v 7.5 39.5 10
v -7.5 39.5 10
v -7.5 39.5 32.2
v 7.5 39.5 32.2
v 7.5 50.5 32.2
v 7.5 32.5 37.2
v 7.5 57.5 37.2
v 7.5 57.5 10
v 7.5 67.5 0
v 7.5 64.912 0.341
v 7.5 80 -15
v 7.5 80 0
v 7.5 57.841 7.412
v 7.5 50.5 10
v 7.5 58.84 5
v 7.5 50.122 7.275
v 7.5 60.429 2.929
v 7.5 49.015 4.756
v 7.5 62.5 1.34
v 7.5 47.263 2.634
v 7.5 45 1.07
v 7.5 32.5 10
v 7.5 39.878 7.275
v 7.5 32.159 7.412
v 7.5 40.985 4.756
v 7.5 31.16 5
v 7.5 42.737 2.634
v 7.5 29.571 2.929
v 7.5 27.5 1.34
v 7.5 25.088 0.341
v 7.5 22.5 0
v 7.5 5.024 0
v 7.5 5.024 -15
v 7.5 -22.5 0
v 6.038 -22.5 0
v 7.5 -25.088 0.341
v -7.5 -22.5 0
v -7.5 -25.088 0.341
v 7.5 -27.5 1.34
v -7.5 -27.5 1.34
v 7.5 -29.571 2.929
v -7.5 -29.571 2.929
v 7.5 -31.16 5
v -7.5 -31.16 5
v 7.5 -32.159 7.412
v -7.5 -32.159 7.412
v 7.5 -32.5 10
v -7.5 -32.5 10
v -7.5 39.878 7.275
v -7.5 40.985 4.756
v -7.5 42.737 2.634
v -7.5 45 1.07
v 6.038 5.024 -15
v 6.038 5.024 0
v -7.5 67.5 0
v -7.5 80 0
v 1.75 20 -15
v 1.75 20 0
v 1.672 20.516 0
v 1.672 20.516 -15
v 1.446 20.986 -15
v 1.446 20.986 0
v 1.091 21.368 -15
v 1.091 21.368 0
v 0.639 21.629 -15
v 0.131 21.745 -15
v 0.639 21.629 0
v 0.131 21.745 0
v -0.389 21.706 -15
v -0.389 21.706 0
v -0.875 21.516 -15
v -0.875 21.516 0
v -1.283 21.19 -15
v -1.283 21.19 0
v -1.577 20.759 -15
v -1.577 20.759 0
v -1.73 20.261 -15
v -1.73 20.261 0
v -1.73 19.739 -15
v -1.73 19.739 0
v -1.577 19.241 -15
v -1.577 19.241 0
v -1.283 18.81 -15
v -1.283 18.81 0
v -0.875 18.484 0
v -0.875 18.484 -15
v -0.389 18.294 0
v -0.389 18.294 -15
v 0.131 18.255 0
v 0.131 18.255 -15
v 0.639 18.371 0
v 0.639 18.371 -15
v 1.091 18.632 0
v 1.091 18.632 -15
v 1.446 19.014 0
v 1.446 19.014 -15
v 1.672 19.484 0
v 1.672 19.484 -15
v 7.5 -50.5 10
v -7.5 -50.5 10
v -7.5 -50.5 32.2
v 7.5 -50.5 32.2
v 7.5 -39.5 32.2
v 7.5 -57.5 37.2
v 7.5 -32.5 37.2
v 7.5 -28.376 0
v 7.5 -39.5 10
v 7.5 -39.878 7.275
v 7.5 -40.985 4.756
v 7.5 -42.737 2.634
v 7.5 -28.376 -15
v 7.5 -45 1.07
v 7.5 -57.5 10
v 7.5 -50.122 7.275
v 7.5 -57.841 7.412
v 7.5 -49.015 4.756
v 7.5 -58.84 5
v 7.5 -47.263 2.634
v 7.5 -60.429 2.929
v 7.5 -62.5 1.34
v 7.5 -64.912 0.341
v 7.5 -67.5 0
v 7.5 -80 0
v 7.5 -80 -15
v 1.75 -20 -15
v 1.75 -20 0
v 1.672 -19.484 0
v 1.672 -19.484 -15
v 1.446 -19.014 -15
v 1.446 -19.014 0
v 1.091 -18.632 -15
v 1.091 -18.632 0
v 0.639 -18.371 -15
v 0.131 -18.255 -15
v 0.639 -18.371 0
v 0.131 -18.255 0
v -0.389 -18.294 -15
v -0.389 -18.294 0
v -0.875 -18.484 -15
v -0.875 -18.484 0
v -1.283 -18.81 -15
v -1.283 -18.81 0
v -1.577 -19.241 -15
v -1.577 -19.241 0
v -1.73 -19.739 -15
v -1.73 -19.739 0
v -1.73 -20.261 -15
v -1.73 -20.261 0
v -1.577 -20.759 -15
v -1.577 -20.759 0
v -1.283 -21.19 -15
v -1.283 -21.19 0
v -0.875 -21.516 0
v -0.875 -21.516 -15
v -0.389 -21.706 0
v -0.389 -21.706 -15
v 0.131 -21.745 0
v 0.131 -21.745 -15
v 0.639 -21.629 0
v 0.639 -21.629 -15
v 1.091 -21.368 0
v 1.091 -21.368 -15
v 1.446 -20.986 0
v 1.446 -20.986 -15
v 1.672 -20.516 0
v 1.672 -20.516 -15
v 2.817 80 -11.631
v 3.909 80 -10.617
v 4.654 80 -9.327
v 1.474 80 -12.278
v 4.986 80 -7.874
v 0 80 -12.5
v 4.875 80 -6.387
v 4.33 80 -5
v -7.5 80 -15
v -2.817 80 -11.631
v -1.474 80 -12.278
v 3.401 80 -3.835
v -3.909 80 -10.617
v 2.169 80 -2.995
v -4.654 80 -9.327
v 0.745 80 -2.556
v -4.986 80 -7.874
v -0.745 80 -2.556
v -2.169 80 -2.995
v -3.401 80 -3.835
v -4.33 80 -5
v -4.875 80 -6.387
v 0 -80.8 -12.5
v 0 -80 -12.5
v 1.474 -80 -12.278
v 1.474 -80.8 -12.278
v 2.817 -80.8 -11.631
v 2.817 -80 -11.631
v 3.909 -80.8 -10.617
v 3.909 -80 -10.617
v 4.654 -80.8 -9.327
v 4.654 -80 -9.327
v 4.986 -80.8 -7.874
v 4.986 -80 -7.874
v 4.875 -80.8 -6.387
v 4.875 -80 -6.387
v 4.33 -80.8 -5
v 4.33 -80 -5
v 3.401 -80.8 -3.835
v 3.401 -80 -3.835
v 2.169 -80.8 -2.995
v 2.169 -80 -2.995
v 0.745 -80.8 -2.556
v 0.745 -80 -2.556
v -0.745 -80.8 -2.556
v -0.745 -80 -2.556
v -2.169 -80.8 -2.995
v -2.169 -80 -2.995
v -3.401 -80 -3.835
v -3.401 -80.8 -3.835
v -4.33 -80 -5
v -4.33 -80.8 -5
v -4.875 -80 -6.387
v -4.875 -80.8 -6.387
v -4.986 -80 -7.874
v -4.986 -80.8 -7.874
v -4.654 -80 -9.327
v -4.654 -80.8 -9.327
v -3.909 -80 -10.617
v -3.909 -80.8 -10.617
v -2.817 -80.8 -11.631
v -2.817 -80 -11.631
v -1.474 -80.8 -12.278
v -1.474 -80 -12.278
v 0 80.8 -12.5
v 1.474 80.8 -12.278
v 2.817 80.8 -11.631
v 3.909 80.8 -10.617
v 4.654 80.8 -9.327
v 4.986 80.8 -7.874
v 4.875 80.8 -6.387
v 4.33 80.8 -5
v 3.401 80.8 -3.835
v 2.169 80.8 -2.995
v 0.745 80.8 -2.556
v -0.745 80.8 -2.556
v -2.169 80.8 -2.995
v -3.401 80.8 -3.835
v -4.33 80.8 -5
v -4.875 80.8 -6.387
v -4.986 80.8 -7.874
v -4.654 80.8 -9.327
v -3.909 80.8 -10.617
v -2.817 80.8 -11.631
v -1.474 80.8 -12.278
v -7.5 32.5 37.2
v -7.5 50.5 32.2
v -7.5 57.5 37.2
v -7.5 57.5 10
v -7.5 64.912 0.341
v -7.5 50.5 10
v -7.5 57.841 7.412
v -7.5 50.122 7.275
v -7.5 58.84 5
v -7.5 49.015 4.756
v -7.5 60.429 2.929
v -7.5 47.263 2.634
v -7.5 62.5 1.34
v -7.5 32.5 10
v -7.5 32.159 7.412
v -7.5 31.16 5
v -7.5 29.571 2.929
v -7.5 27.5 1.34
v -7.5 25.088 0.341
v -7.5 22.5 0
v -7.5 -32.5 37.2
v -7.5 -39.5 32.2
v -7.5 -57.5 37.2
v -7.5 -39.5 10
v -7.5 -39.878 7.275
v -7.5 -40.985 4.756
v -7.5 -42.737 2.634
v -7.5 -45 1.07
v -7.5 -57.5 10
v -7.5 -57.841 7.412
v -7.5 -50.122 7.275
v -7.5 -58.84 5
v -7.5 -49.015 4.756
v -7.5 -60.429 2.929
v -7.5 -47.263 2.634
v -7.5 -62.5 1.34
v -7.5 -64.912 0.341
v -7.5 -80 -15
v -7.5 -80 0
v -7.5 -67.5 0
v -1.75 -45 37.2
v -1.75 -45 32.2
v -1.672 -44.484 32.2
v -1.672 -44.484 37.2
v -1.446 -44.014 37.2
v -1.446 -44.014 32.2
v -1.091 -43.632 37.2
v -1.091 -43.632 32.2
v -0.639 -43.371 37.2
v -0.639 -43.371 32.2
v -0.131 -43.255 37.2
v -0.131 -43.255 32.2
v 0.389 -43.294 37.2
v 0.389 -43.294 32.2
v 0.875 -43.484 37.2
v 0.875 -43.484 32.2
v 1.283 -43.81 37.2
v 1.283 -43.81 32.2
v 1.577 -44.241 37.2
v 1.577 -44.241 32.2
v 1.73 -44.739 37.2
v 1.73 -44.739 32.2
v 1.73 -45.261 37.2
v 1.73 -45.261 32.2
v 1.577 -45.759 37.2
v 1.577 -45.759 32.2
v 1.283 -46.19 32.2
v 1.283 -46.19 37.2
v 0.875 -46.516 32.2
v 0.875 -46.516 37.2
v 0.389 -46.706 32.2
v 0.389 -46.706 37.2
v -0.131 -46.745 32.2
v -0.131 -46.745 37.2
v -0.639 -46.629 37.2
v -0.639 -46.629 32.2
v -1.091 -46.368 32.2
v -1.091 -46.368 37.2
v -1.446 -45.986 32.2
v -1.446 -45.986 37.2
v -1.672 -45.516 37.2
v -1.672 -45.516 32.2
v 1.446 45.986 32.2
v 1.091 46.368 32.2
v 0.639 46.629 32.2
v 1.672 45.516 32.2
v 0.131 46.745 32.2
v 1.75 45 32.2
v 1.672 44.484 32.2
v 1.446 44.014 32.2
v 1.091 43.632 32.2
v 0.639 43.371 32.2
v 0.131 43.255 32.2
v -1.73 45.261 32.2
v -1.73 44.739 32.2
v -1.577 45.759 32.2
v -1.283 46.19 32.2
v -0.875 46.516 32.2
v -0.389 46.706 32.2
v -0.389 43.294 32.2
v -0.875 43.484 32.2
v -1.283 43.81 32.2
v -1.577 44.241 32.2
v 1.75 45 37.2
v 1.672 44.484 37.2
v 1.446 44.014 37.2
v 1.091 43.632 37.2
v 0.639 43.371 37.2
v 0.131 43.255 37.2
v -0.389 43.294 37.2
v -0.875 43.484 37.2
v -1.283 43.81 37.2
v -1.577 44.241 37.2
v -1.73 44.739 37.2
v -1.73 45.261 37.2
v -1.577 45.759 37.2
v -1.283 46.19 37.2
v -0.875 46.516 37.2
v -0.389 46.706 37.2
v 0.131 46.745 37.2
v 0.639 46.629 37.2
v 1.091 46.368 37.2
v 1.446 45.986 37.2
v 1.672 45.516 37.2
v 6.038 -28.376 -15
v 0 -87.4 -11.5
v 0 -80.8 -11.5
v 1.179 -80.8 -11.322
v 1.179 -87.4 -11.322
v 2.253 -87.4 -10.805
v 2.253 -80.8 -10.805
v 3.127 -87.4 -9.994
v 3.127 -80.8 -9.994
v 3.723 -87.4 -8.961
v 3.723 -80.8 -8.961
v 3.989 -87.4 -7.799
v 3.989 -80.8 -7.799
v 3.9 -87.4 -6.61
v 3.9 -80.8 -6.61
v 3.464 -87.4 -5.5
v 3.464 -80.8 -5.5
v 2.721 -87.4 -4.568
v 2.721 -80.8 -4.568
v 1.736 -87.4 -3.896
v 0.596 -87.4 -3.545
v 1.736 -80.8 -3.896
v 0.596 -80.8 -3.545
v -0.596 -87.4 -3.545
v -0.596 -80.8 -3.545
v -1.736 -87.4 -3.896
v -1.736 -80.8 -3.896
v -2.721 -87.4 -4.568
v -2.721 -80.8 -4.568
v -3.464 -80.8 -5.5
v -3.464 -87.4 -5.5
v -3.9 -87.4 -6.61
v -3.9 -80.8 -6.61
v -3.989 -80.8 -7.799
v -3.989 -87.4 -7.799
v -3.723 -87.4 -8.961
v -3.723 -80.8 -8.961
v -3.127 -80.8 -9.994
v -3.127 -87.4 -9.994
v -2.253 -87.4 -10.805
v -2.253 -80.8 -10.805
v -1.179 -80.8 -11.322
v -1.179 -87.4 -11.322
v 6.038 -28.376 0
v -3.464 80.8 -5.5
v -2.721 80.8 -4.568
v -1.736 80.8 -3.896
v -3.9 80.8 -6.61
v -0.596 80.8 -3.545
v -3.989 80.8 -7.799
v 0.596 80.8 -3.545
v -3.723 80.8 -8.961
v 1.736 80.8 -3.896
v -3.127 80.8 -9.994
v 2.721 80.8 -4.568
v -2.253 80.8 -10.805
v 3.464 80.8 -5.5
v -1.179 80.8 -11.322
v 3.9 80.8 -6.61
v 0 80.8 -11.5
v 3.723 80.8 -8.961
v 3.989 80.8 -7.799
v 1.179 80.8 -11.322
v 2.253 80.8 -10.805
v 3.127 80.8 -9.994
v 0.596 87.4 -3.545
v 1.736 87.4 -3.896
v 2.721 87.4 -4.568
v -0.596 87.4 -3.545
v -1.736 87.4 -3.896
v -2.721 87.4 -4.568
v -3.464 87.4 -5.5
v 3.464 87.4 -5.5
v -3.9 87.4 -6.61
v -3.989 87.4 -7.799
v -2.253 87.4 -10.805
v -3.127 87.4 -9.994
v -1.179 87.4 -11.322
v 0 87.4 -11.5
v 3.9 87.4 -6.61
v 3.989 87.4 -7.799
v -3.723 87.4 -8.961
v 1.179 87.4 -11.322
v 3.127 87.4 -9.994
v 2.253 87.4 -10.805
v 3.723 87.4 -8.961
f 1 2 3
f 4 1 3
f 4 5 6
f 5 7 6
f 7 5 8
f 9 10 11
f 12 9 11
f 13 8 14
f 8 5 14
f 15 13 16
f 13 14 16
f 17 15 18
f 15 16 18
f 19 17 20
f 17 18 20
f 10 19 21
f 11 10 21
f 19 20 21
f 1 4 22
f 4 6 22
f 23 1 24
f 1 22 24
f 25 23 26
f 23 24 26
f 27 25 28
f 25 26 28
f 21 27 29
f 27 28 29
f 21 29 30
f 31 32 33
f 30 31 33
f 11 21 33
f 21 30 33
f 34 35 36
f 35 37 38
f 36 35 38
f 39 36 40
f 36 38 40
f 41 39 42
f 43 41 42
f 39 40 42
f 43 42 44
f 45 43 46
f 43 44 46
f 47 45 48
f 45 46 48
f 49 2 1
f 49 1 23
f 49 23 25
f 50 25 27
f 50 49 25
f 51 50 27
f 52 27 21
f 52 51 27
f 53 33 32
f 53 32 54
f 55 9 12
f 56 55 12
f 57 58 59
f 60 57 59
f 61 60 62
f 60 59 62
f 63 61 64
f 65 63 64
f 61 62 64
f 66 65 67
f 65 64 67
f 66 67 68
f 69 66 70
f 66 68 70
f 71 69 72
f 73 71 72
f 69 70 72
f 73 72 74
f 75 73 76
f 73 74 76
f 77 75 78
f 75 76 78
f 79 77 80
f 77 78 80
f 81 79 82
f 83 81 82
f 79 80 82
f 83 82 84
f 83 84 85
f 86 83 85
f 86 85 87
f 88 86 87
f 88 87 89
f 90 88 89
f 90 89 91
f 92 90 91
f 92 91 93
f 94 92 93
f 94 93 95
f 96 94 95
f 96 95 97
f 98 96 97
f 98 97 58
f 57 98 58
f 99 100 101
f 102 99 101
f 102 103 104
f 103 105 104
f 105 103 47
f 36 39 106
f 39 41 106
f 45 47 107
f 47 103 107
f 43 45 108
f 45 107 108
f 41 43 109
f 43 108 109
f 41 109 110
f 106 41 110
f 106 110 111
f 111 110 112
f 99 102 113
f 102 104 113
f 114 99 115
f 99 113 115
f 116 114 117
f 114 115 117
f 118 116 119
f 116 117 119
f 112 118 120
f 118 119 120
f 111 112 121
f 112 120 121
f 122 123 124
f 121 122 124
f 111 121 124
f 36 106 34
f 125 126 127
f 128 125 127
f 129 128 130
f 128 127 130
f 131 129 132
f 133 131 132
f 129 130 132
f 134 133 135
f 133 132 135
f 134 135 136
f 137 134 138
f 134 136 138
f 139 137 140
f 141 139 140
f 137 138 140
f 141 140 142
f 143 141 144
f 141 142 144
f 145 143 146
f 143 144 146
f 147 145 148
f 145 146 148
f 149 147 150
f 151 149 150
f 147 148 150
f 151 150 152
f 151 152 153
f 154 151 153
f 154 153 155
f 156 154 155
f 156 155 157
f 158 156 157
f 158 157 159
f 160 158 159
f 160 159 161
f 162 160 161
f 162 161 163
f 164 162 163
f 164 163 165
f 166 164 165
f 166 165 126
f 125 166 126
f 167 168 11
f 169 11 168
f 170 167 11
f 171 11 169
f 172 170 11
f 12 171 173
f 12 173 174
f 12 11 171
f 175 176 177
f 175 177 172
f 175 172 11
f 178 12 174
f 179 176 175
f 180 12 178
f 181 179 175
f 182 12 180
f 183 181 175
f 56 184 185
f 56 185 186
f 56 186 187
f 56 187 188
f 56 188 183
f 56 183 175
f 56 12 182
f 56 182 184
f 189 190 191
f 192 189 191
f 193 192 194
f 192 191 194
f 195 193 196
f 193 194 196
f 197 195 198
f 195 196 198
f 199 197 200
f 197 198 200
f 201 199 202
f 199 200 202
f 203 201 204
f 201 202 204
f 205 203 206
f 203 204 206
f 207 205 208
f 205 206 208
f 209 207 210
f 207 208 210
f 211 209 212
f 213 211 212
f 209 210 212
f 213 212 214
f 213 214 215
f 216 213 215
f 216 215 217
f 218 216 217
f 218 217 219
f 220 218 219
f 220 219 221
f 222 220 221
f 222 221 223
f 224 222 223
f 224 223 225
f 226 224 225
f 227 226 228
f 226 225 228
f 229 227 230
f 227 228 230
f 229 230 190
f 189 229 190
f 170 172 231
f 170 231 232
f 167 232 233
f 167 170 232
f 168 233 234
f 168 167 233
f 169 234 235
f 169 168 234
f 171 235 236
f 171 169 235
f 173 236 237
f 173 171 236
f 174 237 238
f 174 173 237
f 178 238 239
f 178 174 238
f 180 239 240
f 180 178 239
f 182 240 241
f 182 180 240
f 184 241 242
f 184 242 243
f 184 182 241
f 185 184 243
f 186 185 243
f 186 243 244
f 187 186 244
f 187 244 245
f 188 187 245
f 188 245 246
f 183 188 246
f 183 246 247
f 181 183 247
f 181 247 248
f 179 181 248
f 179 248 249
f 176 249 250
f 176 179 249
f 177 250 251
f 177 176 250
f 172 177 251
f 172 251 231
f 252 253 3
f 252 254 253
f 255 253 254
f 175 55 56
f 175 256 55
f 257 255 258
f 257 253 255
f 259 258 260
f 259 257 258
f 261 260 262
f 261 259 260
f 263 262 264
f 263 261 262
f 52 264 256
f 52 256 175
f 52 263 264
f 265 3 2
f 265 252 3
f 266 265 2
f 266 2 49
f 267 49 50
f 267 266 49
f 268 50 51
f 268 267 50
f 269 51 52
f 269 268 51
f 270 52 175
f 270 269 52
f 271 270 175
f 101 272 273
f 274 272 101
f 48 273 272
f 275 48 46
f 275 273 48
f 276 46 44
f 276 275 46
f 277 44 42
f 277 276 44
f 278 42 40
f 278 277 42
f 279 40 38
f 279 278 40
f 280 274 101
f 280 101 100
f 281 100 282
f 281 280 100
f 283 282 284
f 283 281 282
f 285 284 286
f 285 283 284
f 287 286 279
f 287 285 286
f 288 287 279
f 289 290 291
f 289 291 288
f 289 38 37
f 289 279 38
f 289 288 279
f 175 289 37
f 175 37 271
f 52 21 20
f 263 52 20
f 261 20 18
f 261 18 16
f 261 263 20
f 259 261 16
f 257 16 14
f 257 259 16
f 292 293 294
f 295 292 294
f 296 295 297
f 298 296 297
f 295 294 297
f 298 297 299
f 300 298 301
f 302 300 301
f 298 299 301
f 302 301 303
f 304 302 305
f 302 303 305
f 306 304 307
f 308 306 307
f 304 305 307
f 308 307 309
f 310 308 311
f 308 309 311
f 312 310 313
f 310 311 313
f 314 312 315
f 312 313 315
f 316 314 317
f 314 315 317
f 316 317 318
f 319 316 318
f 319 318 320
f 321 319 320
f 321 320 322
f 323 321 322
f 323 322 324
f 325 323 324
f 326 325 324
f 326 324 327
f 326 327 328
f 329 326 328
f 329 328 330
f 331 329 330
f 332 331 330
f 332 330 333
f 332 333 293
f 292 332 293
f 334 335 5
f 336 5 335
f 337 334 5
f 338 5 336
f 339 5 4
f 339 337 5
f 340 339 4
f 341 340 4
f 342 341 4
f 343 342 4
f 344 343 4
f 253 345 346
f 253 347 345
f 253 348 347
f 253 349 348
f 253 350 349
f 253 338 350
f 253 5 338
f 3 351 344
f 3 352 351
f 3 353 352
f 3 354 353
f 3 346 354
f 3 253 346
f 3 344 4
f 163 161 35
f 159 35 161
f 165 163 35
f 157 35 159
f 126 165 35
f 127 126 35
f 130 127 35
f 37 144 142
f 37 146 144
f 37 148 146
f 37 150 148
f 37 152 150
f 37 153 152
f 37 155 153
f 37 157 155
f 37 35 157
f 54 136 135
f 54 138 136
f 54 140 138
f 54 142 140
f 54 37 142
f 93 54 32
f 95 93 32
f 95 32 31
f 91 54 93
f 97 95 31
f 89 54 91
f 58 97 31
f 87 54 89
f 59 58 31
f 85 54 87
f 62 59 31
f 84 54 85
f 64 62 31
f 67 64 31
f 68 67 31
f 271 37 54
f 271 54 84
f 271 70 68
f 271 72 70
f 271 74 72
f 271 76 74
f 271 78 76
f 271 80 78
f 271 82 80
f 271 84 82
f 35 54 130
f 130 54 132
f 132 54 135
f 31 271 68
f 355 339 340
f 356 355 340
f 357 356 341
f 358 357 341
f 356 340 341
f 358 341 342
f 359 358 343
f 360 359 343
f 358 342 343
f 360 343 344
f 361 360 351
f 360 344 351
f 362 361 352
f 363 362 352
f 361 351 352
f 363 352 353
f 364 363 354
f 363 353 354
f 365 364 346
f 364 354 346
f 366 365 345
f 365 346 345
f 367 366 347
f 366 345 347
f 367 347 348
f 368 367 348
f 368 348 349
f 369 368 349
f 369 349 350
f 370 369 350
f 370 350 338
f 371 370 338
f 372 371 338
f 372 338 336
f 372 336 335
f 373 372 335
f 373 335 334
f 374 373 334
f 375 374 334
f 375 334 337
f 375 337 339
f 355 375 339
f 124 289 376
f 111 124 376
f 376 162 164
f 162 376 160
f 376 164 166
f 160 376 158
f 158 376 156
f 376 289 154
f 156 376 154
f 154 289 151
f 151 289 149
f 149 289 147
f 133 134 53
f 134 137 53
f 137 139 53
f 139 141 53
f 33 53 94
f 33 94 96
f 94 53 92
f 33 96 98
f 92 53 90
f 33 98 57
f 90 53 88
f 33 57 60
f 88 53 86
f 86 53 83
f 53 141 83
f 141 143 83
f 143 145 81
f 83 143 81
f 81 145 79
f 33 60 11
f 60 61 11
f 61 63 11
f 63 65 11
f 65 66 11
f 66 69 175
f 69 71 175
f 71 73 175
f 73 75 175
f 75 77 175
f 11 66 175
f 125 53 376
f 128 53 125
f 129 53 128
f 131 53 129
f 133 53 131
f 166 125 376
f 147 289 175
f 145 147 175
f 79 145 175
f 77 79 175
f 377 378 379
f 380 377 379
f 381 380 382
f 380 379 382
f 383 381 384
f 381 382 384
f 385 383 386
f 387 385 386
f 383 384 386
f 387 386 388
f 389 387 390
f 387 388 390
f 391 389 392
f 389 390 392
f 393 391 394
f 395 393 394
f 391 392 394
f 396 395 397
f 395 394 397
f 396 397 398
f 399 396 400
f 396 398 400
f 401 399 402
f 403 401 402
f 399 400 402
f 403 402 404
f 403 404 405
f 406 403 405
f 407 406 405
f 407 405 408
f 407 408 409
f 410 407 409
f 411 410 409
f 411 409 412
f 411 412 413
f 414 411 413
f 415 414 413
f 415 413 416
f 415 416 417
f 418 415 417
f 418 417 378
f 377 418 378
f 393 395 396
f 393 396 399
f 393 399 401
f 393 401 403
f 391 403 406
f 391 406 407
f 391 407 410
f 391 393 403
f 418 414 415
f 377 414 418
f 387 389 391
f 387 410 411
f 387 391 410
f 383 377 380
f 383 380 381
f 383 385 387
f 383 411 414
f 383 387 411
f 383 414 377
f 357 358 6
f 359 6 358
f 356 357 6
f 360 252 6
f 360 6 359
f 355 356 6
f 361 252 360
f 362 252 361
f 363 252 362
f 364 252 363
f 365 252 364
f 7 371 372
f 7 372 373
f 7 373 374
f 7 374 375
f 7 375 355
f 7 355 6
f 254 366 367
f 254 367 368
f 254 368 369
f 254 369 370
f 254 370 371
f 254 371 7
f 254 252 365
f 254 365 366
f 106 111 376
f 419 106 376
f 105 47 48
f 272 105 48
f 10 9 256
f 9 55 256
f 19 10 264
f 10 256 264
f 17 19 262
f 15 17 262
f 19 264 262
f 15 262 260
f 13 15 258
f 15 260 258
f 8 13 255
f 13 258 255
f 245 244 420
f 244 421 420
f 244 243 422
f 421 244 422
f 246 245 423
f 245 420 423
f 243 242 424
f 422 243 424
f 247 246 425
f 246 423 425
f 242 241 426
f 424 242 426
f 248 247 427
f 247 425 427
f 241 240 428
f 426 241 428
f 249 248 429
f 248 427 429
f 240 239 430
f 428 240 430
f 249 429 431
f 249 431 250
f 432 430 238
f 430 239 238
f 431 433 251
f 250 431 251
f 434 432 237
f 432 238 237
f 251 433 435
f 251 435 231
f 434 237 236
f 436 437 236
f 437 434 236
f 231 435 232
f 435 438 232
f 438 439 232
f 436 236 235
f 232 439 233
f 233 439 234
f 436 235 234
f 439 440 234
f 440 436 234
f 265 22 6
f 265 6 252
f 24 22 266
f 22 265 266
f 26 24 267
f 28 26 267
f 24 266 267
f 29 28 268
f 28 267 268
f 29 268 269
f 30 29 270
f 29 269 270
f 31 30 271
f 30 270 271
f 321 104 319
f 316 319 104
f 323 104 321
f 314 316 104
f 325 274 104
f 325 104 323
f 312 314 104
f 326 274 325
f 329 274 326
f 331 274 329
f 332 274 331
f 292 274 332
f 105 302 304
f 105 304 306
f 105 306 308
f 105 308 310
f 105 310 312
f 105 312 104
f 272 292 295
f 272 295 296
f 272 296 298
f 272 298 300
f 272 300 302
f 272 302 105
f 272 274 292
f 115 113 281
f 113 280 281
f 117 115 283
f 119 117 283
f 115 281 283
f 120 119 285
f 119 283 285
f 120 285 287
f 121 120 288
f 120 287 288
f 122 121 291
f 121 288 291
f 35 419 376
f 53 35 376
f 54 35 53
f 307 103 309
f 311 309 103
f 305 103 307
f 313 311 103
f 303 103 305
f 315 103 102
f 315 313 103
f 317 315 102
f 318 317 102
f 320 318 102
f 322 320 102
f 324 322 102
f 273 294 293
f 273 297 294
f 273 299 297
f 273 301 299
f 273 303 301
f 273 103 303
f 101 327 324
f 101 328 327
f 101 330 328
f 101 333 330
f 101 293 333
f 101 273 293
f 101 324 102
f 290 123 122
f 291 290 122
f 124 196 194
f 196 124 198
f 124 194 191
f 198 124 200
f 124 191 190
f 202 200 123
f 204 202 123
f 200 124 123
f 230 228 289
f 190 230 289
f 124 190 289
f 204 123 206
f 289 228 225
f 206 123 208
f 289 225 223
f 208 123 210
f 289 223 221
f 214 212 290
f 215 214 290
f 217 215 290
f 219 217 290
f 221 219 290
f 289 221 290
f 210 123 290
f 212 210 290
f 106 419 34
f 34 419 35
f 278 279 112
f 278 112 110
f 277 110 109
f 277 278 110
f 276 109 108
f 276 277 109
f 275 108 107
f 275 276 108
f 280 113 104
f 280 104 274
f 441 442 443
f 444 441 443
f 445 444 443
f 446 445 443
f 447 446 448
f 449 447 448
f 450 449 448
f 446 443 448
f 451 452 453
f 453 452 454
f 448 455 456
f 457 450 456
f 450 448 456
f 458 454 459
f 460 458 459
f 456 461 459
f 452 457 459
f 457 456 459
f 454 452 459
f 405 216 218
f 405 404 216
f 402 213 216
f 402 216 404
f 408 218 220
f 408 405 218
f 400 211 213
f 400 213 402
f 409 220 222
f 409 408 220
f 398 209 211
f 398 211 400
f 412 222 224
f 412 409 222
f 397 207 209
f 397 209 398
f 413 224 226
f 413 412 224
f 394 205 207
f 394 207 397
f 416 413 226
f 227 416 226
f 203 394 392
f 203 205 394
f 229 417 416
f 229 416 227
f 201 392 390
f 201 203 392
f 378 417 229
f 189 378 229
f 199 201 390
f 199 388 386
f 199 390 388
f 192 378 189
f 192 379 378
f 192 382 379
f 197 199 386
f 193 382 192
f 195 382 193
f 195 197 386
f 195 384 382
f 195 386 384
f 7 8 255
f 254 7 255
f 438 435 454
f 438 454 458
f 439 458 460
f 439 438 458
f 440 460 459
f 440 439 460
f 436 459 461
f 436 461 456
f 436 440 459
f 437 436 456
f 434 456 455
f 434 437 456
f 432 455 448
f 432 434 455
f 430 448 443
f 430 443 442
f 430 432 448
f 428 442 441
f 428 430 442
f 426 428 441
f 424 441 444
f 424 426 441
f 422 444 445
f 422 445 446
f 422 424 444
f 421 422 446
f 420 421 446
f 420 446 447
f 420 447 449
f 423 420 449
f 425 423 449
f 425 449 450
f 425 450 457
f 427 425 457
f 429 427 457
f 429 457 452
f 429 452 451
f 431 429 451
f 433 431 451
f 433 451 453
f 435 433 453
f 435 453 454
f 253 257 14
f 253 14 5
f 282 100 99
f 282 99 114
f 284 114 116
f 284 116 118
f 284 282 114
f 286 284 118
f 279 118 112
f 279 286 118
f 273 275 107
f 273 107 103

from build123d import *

# Parameters (mm, degrees)
ESQUISSE1_W                      = 25
ESQUISSE1_H                      = 15
BOSS_EXTRU_1_DEPTH               = 37.2
BOSS_EXTRU_1_2_DEPTH             = 37.2
ESQUISSE3_W                      = 160
ESQUISSE3_H                      = 15
BOSS_EXTRU_2_DEPTH               = 15
ESQUISSE4_R                      = 5
ESQUISSE4_R_2                    = 4
BOSS_EXTRU_5_DEPTH               = 0.8
ESQUISSE4_6_R                    = 4
BOSS_EXTRU_6_DEPTH               = 7.4
CONG_1_R                         = 10
ESQUISSE5_W                      = 11
ESQUISSE5_H                      = 32.2
ENL_V_MAT_EXTRU_1_DEPTH          = 97.164442493
CONG_2_R                         = 10
ESQUISSE6_R                      = 1.75
ENL_V_MAT_EXTRU_2_DEPTH          = 100.613503101
ESQUISSE11_R                     = 1.75
TROUS_VIS_SUPPORT_CAPTEURS_DEPTH = 96.282999533
ESQUISSE12_W                     = 33.4
ESQUISSE12_H                     = 4.7
ENCOCHE_CARTE_CAPTEUR_DEPTH      = 96.282999533


with BuildPart() as part:
    # Esquisse1 → Boss.-Extru.1 (new body)
    with BuildSketch(Plane(origin=(0, 0, 0), x_dir=(0, 1, 0), z_dir=(0, 0, 1))):
        with Locations((-45, 0)):
            Rectangle(ESQUISSE1_W, ESQUISSE1_H)
    extrude(amount=BOSS_EXTRU_1_DEPTH)



with BuildPart() as body_2:
    # Esquisse1 → Boss.-Extru.1 2 (new body)
    with BuildSketch(Plane(origin=(0, 0, 0), x_dir=(0, 1, 0), z_dir=(0, 0, 1))):
        with Locations((45, 0)):
            Rectangle(ESQUISSE1_W, ESQUISSE1_H)
    extrude(amount=BOSS_EXTRU_1_2_DEPTH)


with BuildPart() as part_1:
    add(part.part)

    add(body_2.part)  # Boss.-Extru.2 merges body 2
    # Esquisse3 → Boss.-Extru.2 (add)
    with BuildSketch(Plane(origin=(0, 0, 0), x_dir=(0, 1, 0), z_dir=(0, 0, 1))):
        Rectangle(ESQUISSE3_W, ESQUISSE3_H)
    extrude(amount=-BOSS_EXTRU_2_DEPTH)

    # Esquisse4 → Boss.-Extru.5 (add)
    with BuildSketch(Plane(origin=(0, -80, 0), x_dir=(-1, 0, 0), z_dir=(0, -1, 0))):
        with Locations(Location((0, 7.5, 0), (0, 0, 90))):
            Circle(ESQUISSE4_R)
        with Locations(Location((0, 7.5, 0), (0, 0, 90))):
            Circle(ESQUISSE4_R_2, mode=Mode.SUBTRACT)
    boss_extru_5 = extrude(amount=BOSS_EXTRU_5_DEPTH)

    # Esquisse4<6> → Boss.-Extru.6 (add)
    with BuildSketch(Plane(origin=(0, -80, 0), x_dir=(-1, 0, 0), z_dir=(0, -1, 0))):
        with Locations(Location((0, 7.5, 0), (0, 0, 90))):
            Circle(ESQUISSE4_6_R)
    boss_extru_6 = extrude(amount=BOSS_EXTRU_6_DEPTH)

    # Symétrie2: Boss.-Extru.5, Boss.-Extru.6 across plane
    add(boss_extru_5.mirror(Plane.ZX))
    add(boss_extru_6.mirror(Plane.ZX))

    # Congé1
    cong_1_edges = [part_1.edges().sort_by_distance(p)[0] for p in [
        (0, 57.5, 0),
        (0, 32.5, 0),
        (0, -57.5, 0),
        (0, -32.5, 0),
    ]]
    fillet(cong_1_edges, radius=CONG_1_R)

    # Esquisse5 → Enlèv. mat.-Extru.1 (cut, through all)
    with BuildSketch(Plane(origin=(-7.5, 0, 0), x_dir=(0, -1, 0), z_dir=(-1, 0, 0))):
        with Locations((45, 16.1)):
            Rectangle(ESQUISSE5_W, ESQUISSE5_H)
        with Locations((-45, 16.1)):
            Rectangle(ESQUISSE5_W, ESQUISSE5_H)
    extrude(amount=-ENL_V_MAT_EXTRU_1_DEPTH, mode=Mode.SUBTRACT)

    # Congé2
    # the kernel refuses this fillet: 10 mm, written as the material it adds along each edge
    with BuildSketch(Plane(origin=(-7.5, 39.5, 0), x_dir=(0, 0, 1), z_dir=(1, 0, 0)), Plane(origin=(-7.5, -39.5, 0), x_dir=(0, -1, 0), z_dir=(1, 0, 0)), Plane(origin=(-7.5, -50.5, 0), x_dir=(0, 0, 1), z_dir=(1, 0, 0))) as cong_2_piece_1:
        with BuildLine():
            CenterArc((CONG_2_R, -CONG_2_R), CONG_2_R, 90, 90)
            Line((0, -CONG_2_R), (0, 0))
            Line((0, 0), (CONG_2_R, 0))
        make_face()
    extrude(amount=15)
    with BuildSketch(Plane(origin=(-7.5, 50.5, 0), x_dir=(0, 0, 1), z_dir=(1, 0, 0))) as cong_2_piece_2:
        with BuildLine():
            CenterArc((CONG_2_R, CONG_2_R), CONG_2_R, 180, 90)
            Line((0, CONG_2_R), (0, 0))
            Line((0, 0), (CONG_2_R, 0))
        make_face()
    extrude(amount=15)

    # Esquisse6 → Enlèv. mat.-Extru.2 (cut, through all)
    with BuildSketch(Plane(origin=(0, 0, 32.2), x_dir=(1, 0, 0), z_dir=(0, 0, -1))):
        with Locations(Location((0, 45, 0), (0, 0, 180))):
            Circle(ESQUISSE6_R)
        with Locations((0, -45)):
            Circle(ESQUISSE6_R)
    extrude(amount=-ENL_V_MAT_EXTRU_2_DEPTH, mode=Mode.SUBTRACT)

    # Esquisse11 → Trous vis support capteurs (cut, through all)
    with BuildSketch(Plane(origin=(0, 0, 0), x_dir=(0, 1, 0), z_dir=(0, 0, 1))):
        with Locations(Location((20, 0, 0), (0, 0, 270))):
            Circle(ESQUISSE11_R)
        with Locations(Location((-20, 0, 0), (0, 0, 270))):
            Circle(ESQUISSE11_R)
    extrude(amount=-TROUS_VIS_SUPPORT_CAPTEURS_DEPTH, mode=Mode.SUBTRACT)

    # Esquisse12 → Encoche carte capteur (cut, through all)
    with BuildSketch(Plane(origin=(0, 0, 0), x_dir=(0, 1, 0), z_dir=(0, 0, 1))):
        with Locations((-11.675958981, -8.388484641)):
            Rectangle(ESQUISSE12_W, ESQUISSE12_H)
    extrude(amount=-ENCOCHE_CARTE_CAPTEUR_DEPTH, mode=Mode.SUBTRACT)


solid = part_1.part
